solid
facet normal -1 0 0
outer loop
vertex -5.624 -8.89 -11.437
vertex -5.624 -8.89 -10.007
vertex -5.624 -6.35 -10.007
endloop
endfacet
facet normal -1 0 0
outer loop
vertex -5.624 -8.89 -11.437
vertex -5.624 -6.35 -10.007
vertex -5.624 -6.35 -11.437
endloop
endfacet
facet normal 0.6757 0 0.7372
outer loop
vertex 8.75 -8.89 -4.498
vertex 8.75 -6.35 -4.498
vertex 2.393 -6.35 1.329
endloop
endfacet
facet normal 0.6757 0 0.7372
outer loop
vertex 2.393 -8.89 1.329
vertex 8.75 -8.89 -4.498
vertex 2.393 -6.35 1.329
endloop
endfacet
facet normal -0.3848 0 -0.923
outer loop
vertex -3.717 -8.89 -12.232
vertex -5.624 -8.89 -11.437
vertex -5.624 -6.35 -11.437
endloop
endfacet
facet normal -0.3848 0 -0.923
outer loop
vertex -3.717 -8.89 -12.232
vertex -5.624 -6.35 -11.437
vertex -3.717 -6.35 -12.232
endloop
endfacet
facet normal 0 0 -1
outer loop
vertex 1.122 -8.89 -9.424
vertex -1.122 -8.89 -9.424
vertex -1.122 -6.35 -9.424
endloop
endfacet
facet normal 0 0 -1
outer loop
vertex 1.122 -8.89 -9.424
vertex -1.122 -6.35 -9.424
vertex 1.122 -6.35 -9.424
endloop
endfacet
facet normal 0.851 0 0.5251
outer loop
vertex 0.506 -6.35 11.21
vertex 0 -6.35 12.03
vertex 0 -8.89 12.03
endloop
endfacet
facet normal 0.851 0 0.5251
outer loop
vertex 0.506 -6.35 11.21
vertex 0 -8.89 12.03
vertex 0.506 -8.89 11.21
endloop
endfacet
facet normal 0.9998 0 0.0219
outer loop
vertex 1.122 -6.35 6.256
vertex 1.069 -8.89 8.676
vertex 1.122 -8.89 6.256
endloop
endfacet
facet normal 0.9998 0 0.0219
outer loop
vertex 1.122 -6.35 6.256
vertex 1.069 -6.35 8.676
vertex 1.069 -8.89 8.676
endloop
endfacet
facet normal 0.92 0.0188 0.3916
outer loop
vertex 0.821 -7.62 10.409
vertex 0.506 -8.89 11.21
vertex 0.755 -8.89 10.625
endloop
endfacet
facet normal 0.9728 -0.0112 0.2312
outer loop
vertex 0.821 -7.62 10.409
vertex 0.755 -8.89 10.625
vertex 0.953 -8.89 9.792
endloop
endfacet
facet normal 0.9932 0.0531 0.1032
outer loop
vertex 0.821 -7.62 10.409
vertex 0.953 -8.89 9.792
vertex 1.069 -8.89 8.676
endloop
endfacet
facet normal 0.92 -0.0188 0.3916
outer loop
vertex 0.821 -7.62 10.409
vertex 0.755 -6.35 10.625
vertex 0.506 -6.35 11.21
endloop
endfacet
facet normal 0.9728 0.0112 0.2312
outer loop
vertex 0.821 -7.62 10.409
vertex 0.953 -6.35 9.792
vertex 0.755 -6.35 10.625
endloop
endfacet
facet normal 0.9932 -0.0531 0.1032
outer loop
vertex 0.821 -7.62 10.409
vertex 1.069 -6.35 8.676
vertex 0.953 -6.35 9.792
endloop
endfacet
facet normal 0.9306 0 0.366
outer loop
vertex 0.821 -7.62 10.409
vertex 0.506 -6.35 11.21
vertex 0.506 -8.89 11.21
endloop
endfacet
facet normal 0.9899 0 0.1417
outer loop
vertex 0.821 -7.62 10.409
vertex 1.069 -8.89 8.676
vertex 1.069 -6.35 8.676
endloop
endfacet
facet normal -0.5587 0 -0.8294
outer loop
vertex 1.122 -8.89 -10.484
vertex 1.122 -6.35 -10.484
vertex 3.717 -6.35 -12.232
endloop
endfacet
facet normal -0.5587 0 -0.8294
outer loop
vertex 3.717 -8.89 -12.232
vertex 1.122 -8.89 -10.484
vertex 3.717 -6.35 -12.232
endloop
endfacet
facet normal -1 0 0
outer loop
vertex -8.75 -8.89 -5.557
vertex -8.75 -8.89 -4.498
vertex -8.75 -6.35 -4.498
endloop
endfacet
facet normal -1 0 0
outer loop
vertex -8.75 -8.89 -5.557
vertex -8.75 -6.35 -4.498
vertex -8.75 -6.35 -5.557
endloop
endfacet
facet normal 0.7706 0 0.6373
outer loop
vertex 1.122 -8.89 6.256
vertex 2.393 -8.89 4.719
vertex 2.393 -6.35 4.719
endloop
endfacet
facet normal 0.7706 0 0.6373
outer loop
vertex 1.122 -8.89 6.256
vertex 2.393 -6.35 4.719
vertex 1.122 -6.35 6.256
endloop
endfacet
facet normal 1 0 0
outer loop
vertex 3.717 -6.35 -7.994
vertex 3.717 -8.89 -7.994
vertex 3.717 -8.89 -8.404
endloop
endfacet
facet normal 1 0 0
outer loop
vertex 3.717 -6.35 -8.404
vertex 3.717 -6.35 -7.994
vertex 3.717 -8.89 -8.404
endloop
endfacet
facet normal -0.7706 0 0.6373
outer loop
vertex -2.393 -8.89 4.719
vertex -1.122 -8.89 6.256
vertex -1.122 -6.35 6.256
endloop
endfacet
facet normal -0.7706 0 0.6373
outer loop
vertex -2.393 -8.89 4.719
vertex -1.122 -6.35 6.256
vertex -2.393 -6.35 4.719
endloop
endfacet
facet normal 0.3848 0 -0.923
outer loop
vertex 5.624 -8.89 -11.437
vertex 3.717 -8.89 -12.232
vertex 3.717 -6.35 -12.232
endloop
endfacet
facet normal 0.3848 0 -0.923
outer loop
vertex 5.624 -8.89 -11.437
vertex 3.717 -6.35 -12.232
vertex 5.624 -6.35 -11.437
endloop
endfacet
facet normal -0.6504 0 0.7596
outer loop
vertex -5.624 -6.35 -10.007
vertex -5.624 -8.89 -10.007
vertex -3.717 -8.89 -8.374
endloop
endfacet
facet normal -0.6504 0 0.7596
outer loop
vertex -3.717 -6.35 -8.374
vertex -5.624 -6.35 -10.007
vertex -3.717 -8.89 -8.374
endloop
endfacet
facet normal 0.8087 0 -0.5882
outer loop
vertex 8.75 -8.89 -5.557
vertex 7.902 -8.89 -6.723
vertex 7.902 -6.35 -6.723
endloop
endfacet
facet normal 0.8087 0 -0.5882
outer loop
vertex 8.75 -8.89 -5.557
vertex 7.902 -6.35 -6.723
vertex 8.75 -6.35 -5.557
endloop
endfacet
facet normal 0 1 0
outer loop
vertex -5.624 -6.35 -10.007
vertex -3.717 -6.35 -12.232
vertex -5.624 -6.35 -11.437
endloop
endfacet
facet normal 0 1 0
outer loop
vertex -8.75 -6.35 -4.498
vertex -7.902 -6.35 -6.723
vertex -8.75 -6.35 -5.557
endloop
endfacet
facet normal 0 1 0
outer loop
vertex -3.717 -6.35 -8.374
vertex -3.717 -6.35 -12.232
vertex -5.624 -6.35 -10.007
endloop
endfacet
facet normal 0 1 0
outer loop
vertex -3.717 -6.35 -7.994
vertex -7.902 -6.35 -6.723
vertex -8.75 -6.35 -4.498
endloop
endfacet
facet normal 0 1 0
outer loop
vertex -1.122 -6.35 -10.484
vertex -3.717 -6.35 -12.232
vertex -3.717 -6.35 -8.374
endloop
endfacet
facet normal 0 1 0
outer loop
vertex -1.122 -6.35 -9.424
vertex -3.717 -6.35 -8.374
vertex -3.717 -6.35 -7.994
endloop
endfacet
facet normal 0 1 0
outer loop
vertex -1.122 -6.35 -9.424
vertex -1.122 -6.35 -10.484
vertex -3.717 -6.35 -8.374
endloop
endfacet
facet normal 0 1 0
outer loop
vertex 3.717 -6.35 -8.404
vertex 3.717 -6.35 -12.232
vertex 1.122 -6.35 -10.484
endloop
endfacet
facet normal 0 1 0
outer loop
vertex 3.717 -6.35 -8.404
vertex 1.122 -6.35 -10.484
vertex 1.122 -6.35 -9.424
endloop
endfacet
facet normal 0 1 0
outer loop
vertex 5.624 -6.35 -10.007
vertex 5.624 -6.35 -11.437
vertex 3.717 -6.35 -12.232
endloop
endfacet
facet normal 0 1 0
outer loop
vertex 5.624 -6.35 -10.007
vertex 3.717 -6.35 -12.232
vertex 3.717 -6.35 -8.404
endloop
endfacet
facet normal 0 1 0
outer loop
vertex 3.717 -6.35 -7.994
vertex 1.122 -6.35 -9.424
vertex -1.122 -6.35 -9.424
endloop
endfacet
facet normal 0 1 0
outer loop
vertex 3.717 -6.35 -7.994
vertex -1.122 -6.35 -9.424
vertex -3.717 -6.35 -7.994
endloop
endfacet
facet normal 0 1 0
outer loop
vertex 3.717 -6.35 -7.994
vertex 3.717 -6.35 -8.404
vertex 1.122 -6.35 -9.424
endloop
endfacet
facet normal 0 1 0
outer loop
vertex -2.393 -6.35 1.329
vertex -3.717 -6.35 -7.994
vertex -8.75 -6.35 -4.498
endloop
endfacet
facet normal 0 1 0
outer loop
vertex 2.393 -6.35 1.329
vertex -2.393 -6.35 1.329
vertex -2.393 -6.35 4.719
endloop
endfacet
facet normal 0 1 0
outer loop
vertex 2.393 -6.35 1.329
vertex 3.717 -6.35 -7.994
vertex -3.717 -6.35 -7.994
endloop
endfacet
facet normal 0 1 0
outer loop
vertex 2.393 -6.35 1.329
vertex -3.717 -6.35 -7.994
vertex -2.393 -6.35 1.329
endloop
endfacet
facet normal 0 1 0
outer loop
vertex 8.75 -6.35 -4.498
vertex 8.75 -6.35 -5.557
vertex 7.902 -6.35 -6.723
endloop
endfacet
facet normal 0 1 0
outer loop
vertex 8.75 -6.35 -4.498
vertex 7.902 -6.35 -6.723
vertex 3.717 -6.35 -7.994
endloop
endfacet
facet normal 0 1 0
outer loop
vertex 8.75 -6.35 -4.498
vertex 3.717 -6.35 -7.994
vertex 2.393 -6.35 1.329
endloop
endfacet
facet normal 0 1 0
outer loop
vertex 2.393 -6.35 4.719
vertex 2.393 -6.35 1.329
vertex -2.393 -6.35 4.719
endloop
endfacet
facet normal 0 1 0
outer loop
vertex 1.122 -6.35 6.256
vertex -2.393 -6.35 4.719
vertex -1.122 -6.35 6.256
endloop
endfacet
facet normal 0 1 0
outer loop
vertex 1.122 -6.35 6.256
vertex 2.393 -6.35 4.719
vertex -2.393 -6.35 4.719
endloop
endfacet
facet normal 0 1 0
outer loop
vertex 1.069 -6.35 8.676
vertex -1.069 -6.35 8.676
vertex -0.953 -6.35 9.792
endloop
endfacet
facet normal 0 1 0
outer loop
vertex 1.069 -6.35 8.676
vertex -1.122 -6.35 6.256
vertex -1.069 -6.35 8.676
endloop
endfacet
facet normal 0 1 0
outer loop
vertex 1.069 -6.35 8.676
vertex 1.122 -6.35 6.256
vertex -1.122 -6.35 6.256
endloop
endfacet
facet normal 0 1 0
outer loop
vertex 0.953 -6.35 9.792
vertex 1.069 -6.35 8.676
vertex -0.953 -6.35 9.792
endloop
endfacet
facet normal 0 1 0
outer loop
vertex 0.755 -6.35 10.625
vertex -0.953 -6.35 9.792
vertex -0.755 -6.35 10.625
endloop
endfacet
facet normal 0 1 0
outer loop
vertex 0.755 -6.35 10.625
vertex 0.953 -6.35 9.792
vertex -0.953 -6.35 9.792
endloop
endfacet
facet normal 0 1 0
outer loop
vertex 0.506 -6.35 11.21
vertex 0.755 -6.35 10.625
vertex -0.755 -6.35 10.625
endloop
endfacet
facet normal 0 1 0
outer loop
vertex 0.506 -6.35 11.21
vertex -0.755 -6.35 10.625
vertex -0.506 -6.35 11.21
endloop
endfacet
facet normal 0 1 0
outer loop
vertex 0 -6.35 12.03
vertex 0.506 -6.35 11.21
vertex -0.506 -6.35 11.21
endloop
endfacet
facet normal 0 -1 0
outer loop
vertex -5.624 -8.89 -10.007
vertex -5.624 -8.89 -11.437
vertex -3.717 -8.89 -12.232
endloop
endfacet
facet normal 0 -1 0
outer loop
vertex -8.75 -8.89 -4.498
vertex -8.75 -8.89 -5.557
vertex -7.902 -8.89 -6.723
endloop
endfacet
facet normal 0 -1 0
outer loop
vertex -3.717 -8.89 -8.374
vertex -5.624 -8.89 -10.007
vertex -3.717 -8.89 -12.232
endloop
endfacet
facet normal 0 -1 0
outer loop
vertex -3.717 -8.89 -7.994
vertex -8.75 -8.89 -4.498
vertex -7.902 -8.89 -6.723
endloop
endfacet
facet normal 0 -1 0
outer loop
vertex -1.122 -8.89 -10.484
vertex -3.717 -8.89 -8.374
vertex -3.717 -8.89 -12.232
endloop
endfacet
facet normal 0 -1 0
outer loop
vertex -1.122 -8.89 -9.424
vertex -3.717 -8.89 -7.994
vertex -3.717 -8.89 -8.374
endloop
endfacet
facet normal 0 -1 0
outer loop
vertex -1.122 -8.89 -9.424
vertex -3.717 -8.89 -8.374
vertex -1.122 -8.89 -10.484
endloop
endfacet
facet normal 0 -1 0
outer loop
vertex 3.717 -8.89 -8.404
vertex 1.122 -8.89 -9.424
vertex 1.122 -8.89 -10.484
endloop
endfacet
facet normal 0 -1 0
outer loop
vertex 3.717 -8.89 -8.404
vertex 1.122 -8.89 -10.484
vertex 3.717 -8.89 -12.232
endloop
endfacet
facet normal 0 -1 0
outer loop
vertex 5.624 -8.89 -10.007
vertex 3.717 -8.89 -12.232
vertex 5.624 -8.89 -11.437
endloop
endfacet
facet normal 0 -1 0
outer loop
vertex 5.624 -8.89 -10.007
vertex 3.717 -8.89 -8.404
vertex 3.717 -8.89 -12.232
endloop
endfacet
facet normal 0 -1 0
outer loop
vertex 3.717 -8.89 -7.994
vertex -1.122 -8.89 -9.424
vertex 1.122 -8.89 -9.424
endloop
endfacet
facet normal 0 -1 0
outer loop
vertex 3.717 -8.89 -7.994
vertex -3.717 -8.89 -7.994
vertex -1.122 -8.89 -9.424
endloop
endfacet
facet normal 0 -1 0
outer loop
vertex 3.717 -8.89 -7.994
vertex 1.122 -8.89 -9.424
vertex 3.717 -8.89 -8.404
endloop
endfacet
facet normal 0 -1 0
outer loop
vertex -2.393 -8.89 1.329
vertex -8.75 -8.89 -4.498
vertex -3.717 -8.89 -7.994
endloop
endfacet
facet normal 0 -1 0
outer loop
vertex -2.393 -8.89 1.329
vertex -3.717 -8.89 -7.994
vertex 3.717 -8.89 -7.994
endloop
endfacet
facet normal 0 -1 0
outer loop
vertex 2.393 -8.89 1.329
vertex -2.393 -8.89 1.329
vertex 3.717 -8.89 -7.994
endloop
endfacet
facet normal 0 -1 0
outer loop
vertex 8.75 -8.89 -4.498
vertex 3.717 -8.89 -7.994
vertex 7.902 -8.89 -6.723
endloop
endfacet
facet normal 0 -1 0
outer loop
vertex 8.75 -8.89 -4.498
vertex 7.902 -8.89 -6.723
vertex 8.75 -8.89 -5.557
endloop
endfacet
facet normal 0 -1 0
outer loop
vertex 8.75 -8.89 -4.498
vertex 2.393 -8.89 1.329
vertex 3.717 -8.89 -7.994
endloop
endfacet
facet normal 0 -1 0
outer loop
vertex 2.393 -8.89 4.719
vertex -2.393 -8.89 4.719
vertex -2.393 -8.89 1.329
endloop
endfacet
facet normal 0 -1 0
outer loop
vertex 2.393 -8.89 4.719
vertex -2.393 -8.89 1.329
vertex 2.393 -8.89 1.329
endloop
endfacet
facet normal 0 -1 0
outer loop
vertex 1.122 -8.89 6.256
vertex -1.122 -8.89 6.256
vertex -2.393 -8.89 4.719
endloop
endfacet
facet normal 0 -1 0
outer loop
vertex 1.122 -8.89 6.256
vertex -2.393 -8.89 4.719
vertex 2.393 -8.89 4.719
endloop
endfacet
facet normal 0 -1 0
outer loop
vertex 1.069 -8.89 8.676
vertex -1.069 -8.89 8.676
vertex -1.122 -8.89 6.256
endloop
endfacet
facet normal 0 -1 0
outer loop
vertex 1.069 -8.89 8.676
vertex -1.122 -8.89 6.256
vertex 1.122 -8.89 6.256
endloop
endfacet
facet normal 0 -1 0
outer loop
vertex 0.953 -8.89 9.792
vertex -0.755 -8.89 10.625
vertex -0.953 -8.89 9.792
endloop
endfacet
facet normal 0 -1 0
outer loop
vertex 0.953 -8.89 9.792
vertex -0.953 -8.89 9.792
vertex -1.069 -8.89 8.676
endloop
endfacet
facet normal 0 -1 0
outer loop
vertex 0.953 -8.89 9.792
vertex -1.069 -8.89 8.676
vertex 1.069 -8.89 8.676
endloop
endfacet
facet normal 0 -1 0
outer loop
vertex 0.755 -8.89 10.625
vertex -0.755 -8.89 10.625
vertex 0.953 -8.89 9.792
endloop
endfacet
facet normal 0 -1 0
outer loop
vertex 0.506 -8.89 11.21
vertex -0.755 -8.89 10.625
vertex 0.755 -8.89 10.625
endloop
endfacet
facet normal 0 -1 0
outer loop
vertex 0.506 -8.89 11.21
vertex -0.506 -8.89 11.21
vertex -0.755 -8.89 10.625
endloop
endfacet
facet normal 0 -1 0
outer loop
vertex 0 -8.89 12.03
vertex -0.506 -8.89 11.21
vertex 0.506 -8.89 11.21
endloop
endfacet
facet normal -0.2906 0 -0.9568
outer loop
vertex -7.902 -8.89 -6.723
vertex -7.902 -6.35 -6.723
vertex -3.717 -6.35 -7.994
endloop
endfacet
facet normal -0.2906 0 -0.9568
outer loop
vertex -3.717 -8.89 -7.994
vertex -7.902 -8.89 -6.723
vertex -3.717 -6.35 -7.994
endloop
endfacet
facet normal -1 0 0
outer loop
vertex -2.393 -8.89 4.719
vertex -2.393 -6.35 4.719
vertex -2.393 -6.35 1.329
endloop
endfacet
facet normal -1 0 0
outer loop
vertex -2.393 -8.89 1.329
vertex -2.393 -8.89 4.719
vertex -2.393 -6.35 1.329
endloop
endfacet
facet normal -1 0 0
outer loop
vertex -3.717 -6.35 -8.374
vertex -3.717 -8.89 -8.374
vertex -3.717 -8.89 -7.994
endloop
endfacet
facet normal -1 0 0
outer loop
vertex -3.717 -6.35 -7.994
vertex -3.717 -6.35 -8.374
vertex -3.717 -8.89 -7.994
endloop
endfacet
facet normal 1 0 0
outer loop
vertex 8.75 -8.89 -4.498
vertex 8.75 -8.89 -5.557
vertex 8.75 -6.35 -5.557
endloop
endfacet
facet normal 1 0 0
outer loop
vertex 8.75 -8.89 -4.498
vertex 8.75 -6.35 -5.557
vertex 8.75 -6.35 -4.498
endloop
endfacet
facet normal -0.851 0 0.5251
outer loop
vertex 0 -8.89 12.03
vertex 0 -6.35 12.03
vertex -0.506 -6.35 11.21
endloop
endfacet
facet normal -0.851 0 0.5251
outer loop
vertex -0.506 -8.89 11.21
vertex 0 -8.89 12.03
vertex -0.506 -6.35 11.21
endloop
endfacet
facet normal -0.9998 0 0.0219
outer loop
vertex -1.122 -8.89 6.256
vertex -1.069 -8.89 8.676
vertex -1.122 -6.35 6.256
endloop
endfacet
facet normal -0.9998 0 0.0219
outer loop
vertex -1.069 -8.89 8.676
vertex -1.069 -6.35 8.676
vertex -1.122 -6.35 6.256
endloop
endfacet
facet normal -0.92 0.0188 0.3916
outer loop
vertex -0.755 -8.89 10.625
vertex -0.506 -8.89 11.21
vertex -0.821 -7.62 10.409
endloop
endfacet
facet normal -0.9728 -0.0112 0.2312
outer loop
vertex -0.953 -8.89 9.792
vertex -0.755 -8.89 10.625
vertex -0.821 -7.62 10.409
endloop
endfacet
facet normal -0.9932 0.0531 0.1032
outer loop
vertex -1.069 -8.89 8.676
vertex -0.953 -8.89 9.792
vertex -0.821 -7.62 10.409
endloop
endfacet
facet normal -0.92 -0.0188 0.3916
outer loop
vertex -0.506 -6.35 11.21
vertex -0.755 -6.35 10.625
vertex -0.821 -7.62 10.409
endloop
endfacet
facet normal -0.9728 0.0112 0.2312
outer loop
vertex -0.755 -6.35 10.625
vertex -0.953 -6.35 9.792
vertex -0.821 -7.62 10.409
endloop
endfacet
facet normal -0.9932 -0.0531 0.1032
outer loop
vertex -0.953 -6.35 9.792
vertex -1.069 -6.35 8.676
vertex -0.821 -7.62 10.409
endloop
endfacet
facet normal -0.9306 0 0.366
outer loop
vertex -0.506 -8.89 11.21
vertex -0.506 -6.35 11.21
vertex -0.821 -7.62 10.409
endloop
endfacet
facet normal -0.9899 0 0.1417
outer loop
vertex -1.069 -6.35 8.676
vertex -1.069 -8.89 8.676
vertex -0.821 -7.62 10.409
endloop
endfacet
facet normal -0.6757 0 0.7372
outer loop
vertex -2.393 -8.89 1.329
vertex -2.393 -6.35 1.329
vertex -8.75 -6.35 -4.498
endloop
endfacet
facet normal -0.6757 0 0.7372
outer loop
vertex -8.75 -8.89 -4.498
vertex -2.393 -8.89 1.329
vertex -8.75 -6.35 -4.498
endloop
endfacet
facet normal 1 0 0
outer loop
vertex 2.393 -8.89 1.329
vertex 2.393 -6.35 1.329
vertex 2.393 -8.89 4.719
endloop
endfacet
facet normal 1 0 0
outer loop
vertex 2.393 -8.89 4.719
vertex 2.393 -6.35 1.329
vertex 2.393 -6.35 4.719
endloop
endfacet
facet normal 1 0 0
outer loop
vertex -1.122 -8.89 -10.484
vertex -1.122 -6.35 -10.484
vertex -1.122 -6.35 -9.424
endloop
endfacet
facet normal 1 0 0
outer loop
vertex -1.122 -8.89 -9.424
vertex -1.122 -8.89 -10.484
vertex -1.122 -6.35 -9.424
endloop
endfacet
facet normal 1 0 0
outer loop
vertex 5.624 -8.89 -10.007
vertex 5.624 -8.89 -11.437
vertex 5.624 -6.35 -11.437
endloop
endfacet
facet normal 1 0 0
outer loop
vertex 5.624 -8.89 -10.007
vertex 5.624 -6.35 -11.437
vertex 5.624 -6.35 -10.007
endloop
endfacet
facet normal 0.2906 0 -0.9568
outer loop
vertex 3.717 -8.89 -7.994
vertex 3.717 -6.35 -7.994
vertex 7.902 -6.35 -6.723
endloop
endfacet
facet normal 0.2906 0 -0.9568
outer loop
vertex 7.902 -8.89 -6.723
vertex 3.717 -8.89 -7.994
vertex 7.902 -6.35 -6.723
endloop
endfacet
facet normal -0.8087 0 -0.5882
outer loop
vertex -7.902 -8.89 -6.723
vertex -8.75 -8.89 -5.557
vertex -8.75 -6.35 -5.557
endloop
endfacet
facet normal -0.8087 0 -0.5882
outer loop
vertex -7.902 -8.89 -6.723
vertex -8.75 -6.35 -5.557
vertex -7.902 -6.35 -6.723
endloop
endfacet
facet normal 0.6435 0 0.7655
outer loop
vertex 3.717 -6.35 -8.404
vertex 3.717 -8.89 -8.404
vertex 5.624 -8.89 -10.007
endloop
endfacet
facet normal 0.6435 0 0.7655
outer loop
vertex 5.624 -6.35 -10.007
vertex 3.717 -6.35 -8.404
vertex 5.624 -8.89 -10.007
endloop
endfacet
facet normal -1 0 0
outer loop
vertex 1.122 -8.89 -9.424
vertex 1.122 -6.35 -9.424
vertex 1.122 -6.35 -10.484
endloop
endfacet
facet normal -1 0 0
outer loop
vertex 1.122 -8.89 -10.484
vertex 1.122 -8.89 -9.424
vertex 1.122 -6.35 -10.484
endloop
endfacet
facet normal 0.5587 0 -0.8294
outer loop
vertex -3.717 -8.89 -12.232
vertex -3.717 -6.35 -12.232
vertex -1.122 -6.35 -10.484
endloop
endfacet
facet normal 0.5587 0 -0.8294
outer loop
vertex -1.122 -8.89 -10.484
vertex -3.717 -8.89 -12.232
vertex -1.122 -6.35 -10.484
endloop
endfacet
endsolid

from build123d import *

# Parameters (mm, degrees)
F0_W     = 25.4
F0_H     = 25.4
F1_DEPTH = 6.35
F3_DEPTH = 2.54
F4_W     = 6.35
F4_H     = 25.4
F5_DEPTH = 25.4010001
F7_DEPTH = 2.5410001
F9_DEPTH = 2.5410001


with BuildPart() as f1:
    # F0 (on Front) → F1 (new body)
    with BuildSketch(Plane.XZ):
        Rectangle(F0_W, F0_H)
    extrude(amount=F1_DEPTH)

    # F2 (on face) → F3 (join)
    with BuildSketch(Plane.XZ.offset(6.35)):
        with BuildLine():
            add(Edge.make_bspline(
                [(0, 12.0295938104), (-0.3149582598, 11.5638402948), (-1.1067667998, 10.3929308176), (-1.116096827, 7.8107129391), (-1.1217156425, 6.2556257471)],
                knots=[0, 0, 0, 0, 0.3977707284, 1, 1, 1, 1], degree=3))
            Line((-1.1217156425, 6.2556257471), (-2.3930480238, 4.719432909))
            Line((-2.3930480238, 4.719432909), (-2.3930480238, 1.329213148))
            Line((-2.3930480238, 1.329213148), (-8.7497094646, -4.4977269135))
            Line((-8.7497094646, -4.4977269135), (-8.7497094646, -5.5571701378))
            Line((-8.7497094646, -5.5571701378), (-7.902154699, -6.7225582898))
            Line((-7.902154699, -6.7225582898), (-3.7173526362, -7.9938909039))
            Line((-3.7173526362, -7.9938909039), (-5.6243510917, -10.0068338215))
            Line((-5.6243510917, -10.0068338215), (-5.6243510917, -11.4370826632))
            Line((-5.6243510917, -11.4370826632), (-3.7173526362, -12.2316647321))
            Line((-3.7173526362, -12.2316647321), (-1.1217156425, -10.4835834354))
            Line((-1.1217156425, -10.4835834354), (-1.1217156425, -9.4241397455))
            Line((-1.1217156425, -9.4241397455), (1.1217156425, -9.4241397455))
            Line((1.1217156425, -9.4241397455), (1.1217156425, -10.4835834354))
            Line((1.1217156425, -10.4835834354), (3.7173526362, -12.2316647321))
            Line((3.7173526362, -12.2316647321), (5.6243510917, -11.4370826632))
            Line((5.6243510917, -11.4370826632), (5.6243510917, -10.0068338215))
            Line((5.6243510917, -10.0068338215), (3.7173526362, -7.9938909039))
            Line((3.7173526362, -7.9938909039), (7.902154699, -6.7225582898))
            Line((7.902154699, -6.7225582898), (8.7497094646, -5.5571701378))
            Line((8.7497094646, -5.5571701378), (8.7497094646, -4.4977269135))
            Line((8.7497094646, -4.4977269135), (2.3930480238, 1.329213148))
            Line((2.3930480238, 1.329213148), (2.3930480238, 4.719432909))
            Line((2.3930480238, 4.719432909), (1.1217156425, 6.2556257471))
            add(Edge.make_bspline(
                [(0, 12.0295938104), (0.3149582598, 11.5638402948), (1.1067667998, 10.3929308176), (1.116096827, 7.8107129391), (1.1217156425, 6.2556257471)],
                knots=[0, 0, 0, 0, 0.3977707284, 1, 1, 1, 1], degree=3))
        make_face()
    extrude(amount=F3_DEPTH)

    # F4 (on face) → F5 (cut, through all)
    with BuildSketch(Plane.YZ.offset(12.7)):
        with Locations((-3.175, 0)):
            Rectangle(F4_W, F4_H)
    extrude(amount=-F5_DEPTH, mode=Mode.SUBTRACT)

    # F6 (on face) → F7 (cut, through all)
    with BuildSketch(Plane.XZ.offset(8.89)):
        Polygon((-3.7173526362, -7.9938909039), (-5.6243510917, -10.0068338215), (-3.7173526362, -8.3735641092), align=None)
    extrude(amount=-F7_DEPTH, mode=Mode.SUBTRACT)

    # F8 (on face) → F9 (cut, through all)
    with BuildSketch(Plane.XZ.offset(8.89)):
        Polygon((3.7173526362, -8.4037045017), (5.6243510917, -10.0068338215), (3.7173526362, -7.9938909039), align=None)
    extrude(amount=-F9_DEPTH, mode=Mode.SUBTRACT)


solid = f1.part
